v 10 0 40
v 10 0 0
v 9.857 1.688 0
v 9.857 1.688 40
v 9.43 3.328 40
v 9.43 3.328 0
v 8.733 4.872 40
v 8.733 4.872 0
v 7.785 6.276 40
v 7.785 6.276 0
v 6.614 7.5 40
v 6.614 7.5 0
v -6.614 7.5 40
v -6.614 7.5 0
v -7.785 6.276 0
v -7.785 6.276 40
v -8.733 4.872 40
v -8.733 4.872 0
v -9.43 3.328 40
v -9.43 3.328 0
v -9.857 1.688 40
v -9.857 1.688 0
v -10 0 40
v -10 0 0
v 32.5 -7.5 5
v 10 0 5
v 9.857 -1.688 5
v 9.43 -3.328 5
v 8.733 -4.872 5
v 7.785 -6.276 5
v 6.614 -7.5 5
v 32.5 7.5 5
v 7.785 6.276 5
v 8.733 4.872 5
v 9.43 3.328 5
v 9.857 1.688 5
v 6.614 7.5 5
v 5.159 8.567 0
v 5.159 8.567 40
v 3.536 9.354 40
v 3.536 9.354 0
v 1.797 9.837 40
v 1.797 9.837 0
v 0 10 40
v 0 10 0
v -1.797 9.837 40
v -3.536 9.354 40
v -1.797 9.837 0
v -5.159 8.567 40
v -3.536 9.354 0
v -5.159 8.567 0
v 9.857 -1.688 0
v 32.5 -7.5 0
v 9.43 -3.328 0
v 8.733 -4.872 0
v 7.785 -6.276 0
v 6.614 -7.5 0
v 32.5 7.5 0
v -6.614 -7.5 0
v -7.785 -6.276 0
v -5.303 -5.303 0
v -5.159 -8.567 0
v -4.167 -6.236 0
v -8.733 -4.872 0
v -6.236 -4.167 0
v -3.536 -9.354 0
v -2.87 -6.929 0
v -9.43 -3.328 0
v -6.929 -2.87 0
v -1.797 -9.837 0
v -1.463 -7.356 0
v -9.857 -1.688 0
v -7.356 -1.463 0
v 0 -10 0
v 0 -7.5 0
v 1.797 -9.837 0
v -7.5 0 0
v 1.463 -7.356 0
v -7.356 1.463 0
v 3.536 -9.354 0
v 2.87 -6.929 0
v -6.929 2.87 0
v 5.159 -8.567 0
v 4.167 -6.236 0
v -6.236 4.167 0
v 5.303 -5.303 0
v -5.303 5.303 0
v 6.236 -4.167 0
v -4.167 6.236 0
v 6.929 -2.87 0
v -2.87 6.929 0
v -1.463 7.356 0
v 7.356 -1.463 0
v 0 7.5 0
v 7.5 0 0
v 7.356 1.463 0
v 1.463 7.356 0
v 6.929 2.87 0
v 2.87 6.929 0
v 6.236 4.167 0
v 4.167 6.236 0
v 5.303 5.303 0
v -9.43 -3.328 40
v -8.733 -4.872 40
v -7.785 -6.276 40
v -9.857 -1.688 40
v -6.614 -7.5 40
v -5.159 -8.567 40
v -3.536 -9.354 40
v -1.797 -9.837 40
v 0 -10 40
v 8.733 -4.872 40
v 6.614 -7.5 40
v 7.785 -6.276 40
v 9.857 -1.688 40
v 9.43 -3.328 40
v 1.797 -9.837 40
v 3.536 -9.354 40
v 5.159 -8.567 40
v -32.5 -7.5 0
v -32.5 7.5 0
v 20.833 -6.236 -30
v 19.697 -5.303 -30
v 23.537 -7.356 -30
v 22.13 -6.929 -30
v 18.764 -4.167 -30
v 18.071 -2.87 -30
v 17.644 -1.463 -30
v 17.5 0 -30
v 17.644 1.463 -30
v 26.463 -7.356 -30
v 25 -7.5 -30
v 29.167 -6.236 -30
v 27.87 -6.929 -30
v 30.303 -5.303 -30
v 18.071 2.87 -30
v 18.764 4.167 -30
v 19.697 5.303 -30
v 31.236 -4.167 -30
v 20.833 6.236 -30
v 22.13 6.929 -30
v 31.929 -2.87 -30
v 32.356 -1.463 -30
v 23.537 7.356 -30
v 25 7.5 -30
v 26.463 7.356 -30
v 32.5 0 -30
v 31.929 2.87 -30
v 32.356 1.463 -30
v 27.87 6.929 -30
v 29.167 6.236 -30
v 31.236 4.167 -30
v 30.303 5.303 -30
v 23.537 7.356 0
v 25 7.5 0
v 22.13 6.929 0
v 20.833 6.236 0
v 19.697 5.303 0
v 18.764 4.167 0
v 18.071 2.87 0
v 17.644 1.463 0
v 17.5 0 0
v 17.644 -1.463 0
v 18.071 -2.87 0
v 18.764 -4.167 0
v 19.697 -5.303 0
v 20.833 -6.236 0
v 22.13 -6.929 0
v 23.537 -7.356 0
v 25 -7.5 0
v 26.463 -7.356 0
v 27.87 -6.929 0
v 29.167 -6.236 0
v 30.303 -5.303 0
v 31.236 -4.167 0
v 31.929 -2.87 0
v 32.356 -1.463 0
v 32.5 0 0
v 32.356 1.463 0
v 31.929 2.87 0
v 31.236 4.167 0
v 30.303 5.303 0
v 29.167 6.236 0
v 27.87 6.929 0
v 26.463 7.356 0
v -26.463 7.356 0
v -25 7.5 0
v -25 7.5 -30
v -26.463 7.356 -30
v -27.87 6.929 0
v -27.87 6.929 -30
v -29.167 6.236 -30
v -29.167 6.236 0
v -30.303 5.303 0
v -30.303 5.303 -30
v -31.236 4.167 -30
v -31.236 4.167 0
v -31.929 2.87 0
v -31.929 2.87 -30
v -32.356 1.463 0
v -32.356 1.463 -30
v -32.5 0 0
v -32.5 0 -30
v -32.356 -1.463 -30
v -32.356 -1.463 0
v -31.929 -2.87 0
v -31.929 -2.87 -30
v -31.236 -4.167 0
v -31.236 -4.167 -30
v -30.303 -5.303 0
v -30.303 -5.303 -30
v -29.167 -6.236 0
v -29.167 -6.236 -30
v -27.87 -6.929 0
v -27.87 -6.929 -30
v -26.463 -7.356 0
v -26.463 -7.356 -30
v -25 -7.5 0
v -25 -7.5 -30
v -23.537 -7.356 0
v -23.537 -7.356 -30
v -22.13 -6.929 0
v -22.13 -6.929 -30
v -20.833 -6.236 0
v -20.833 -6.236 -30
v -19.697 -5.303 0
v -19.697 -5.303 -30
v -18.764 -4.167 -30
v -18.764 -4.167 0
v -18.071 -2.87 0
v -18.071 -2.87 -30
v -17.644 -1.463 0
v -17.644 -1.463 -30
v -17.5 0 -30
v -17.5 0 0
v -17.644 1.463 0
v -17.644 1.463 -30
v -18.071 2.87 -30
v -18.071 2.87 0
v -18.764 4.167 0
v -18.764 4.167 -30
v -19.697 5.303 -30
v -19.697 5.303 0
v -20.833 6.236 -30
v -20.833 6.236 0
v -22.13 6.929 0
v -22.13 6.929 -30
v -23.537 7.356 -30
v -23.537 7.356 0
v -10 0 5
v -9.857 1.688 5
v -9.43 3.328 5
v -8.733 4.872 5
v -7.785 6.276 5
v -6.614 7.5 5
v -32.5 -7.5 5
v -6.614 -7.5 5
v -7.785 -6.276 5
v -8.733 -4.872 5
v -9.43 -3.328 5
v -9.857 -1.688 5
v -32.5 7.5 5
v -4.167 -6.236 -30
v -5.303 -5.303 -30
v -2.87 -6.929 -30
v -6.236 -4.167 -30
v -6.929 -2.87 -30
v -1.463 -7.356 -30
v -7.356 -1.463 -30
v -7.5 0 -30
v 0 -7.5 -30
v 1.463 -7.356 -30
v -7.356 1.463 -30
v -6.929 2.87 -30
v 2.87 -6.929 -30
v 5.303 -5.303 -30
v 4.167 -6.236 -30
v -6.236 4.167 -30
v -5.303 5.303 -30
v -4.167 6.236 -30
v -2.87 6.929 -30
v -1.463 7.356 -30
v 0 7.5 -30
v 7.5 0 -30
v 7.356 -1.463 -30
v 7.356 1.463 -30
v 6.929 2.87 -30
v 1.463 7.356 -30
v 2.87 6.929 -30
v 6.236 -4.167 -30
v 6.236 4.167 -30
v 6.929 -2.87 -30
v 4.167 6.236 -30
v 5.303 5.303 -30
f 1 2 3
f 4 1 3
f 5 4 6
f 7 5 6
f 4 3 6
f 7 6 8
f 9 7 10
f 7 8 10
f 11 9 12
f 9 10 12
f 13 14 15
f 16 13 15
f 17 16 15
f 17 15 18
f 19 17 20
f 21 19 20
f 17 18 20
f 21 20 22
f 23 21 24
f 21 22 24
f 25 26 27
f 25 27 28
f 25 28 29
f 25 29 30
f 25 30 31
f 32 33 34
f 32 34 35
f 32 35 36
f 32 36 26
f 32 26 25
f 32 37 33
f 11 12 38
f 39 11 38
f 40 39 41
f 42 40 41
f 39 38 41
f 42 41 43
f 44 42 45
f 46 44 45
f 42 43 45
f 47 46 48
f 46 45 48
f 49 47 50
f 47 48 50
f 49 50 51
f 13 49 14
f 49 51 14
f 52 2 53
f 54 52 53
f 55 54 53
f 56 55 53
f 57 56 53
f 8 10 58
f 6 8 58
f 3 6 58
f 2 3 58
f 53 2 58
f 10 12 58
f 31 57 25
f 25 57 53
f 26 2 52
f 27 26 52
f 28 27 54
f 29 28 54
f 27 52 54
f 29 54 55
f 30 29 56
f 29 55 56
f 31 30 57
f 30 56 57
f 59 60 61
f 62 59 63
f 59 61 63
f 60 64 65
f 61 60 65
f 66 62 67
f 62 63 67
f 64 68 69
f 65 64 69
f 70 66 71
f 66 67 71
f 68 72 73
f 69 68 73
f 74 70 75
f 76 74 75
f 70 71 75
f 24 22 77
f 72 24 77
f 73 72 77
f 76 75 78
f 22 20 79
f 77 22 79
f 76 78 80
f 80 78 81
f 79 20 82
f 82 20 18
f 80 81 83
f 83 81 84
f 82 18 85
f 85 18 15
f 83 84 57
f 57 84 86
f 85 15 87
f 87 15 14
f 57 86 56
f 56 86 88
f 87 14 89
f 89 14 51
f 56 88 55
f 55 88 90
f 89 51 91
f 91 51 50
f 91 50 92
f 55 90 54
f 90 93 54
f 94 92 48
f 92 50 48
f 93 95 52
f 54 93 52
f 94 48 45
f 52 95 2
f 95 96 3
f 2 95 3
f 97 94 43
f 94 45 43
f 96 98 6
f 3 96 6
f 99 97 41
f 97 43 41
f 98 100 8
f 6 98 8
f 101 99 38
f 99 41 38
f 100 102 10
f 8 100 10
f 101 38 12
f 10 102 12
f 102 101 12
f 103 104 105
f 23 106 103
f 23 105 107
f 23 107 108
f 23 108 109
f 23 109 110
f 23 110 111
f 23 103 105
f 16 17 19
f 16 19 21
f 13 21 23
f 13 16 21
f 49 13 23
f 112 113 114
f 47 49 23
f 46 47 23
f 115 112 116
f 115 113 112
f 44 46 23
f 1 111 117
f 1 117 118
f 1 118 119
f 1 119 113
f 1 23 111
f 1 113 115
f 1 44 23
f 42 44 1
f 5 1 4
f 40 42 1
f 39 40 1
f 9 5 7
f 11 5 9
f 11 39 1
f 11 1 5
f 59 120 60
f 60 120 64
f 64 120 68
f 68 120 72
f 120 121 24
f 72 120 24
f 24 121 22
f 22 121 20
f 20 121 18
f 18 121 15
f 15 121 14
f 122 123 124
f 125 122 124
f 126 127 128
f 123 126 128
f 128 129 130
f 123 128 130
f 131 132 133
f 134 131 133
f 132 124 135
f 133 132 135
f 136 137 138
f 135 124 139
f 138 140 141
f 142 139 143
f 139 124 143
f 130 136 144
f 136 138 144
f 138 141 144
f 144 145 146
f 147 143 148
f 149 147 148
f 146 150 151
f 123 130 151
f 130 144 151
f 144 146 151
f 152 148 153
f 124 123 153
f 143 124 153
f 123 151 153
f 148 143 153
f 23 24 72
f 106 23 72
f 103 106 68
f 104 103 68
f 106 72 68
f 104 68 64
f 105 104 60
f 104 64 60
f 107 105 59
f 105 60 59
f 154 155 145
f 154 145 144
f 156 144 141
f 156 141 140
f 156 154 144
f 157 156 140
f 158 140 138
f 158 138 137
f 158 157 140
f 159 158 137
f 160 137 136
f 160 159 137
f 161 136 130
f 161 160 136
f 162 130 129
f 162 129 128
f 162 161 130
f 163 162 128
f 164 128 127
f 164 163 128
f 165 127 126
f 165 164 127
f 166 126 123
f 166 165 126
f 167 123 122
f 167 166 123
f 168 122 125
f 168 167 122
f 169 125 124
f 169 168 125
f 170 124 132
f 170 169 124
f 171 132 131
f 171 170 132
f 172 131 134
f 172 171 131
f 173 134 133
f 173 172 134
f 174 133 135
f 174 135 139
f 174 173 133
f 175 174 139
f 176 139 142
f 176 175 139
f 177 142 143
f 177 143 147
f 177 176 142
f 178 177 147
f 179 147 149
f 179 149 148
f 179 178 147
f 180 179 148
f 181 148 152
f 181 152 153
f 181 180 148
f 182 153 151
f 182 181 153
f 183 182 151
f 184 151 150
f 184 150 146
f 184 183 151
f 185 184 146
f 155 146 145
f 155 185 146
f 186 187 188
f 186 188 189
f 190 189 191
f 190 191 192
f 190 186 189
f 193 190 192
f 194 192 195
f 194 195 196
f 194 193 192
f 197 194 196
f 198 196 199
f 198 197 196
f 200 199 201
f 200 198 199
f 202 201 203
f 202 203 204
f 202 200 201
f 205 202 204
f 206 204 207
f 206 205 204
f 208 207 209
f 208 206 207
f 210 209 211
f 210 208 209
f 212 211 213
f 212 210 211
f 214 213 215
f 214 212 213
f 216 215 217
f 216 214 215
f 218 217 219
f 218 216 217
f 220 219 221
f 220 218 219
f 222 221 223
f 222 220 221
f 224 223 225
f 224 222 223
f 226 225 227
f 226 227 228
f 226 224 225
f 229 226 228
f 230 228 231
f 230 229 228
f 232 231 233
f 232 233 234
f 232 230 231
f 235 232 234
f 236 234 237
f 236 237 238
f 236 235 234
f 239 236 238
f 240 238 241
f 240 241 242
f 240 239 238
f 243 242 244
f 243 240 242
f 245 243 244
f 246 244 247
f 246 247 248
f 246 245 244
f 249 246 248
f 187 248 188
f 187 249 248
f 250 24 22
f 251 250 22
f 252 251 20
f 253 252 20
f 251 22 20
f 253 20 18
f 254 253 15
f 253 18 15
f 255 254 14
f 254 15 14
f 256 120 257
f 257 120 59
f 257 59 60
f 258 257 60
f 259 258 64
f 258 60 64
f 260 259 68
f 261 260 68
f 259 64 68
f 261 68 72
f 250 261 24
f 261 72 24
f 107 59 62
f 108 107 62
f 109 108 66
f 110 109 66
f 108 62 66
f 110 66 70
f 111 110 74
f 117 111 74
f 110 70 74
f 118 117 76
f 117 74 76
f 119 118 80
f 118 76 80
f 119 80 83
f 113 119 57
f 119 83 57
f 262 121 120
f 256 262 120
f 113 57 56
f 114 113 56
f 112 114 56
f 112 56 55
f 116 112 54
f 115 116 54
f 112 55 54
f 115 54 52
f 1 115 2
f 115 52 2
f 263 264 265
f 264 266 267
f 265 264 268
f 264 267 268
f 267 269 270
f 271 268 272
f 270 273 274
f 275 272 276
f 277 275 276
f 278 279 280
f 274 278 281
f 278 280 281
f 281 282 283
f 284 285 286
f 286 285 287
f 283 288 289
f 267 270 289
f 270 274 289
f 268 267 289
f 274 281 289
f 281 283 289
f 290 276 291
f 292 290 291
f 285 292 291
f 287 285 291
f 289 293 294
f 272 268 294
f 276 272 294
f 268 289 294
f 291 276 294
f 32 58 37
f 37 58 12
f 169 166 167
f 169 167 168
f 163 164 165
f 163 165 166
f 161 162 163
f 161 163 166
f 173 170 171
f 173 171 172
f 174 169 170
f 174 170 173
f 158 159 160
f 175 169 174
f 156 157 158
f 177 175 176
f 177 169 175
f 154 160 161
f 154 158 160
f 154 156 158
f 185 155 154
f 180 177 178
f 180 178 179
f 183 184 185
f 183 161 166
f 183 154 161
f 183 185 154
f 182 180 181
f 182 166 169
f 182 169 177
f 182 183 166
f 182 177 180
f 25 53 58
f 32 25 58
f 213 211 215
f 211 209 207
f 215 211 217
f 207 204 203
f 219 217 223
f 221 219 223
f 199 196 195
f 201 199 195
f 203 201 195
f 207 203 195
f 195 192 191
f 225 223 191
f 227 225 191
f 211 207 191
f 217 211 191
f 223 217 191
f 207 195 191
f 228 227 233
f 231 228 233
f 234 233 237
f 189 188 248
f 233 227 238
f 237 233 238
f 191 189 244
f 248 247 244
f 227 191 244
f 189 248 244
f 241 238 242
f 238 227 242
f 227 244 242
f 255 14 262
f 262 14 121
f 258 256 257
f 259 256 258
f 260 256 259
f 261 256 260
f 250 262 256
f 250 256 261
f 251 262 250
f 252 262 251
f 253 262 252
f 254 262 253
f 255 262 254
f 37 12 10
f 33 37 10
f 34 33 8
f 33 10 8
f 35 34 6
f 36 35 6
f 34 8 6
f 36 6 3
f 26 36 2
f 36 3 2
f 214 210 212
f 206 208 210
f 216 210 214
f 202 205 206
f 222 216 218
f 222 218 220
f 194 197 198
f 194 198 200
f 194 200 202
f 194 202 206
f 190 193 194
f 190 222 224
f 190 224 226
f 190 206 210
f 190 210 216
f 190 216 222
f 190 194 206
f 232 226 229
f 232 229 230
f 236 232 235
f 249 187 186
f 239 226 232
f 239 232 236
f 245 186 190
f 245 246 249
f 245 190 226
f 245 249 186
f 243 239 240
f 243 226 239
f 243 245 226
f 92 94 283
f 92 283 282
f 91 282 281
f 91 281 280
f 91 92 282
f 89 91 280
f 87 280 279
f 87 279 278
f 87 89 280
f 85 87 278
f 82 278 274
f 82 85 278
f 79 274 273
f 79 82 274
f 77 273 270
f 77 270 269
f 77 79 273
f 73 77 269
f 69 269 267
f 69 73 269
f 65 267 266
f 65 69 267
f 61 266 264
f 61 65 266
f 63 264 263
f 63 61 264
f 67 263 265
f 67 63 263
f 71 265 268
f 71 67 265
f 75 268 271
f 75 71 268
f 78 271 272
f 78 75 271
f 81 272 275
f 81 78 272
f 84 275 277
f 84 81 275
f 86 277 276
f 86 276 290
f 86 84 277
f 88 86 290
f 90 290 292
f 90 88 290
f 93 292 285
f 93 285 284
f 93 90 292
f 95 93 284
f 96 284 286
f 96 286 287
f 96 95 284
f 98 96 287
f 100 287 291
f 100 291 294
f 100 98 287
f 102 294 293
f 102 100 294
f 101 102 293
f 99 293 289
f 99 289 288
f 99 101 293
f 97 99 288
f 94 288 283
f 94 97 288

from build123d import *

# Parameters (mm, degrees)
F1_DEPTH = 30
F2_DEPTH = 40
F3_DEPTH = 5


with BuildPart() as f1:
    # F0 (on Top) → F1 (new body)
    with BuildSketch(Plane.XY):
        with BuildLine():
            ThreePointArc((-32.5, 0), (-30.3033008589, -5.3033008589), (-25, -7.5))
            ThreePointArc((-25, -7.5), (-19.6966991411, -5.3033008589), (-17.5, 0))
            ThreePointArc((-17.5, 0), (-19.6966991411, 5.3033008589), (-25, 7.5))
            ThreePointArc((-25, 7.5), (-30.3033008589, 5.3033008589), (-32.5, 0))
        make_face()
    extrude(amount=-F1_DEPTH)


with BuildPart() as f1b:
    # F0 (on Top) → F1, piece 2 (new body)
    with BuildSketch(Plane.XY):
        with BuildLine():
            ThreePointArc((-7.5, 0), (-5.3033008508, -5.303300867), (2.3e-08, -7.5))
            ThreePointArc((2.3e-08, -7.5), (5.303300867, -5.3033008508), (7.5, 0))
            ThreePointArc((7.5, 0), (5.3033008671, 5.3033008507), (2.31e-08, 7.5))
            ThreePointArc((2.31e-08, 7.5), (-5.3033008507, 5.3033008671), (-7.5, 0))
        make_face()
    extrude(amount=-F1_DEPTH)

    # F0 (on Top) → F2 (join)
    with BuildSketch(Plane.XY):
        with BuildLine():
            Line((7.5, 0), (10, 0))
            ThreePointArc((10, 0), (9.1143782777, 4.1143782777), (6.6143782777, 7.5))
            Line((6.6143782777, 7.5), (2.31e-08, 7.5))
            ThreePointArc((2.31e-08, 7.5), (5.3033008671, 5.3033008507), (7.5, 0))
        make_face()
        with BuildLine():
            Line((2.31e-08, 7.5), (6.6143782777, 7.5))
            ThreePointArc((6.6143782777, 7.5), (0, 10), (-6.6143782777, 7.5))
            Line((-6.6143782777, 7.5), (2.31e-08, 7.5))
        make_face()
        with BuildLine():
            Line((-10, 0), (-7.5, 0))
            ThreePointArc((-7.5, 0), (-5.3033008507, 5.3033008671), (2.31e-08, 7.5))
            Line((2.31e-08, 7.5), (-6.6143782777, 7.5))
            ThreePointArc((-6.6143782777, 7.5), (-9.1143782777, 4.1143782777), (-10, 0))
        make_face()
        with BuildLine():
            ThreePointArc((-7.5, 0), (-5.3033008508, -5.303300867), (2.3e-08, -7.5))
            ThreePointArc((2.3e-08, -7.5), (5.303300867, -5.3033008508), (7.5, 0))
            ThreePointArc((7.5, 0), (5.3033008671, 5.3033008507), (2.31e-08, 7.5))
            ThreePointArc((2.31e-08, 7.5), (-5.3033008507, 5.3033008671), (-7.5, 0))
        make_face()
        with BuildLine():
            Line((2.3e-08, -7.5), (6.6143782777, -7.5))
            ThreePointArc((6.6143782777, -7.5), (9.1143782777, -4.1143782777), (10, 0))
            Line((10, 0), (7.5, 0))
            ThreePointArc((7.5, 0), (5.303300867, -5.3033008508), (2.3e-08, -7.5))
        make_face()
        with BuildLine():
            ThreePointArc((-6.6143782777, -7.5), (0, -10), (6.6143782777, -7.5))
            Line((6.6143782777, -7.5), (2.3e-08, -7.5))
            Line((2.3e-08, -7.5), (-6.6143782777, -7.5))
        make_face()
        with BuildLine():
            Line((-6.6143782777, -7.5), (2.3e-08, -7.5))
            ThreePointArc((2.3e-08, -7.5), (-5.3033008508, -5.303300867), (-7.5, 0))
            Line((-7.5, 0), (-10, 0))
            ThreePointArc((-10, 0), (-9.1143782777, -4.1143782777), (-6.6143782777, -7.5))
        make_face()
    extrude(amount=F2_DEPTH)


with BuildPart() as f1c:
    # F0 (on Top) → F1, piece 3 (new body)
    with BuildSketch(Plane.XY):
        with BuildLine():
            ThreePointArc((17.5, 0), (19.6966991411, -5.3033008589), (25, -7.5))
            ThreePointArc((25, -7.5), (30.3033008589, -5.3033008589), (32.5, 0))
            ThreePointArc((32.5, 0), (30.3033008589, 5.3033008589), (25, 7.5))
            ThreePointArc((25, 7.5), (19.6966991411, 5.3033008589), (17.5, 0))
        make_face()
    extrude(amount=-F1_DEPTH)


with BuildPart() as f3:
    # F0 (on Top) → F3 (new body)
    with BuildSketch(Plane.XY):
        with BuildLine():
            Line((-32.5, 7.5), (-32.5, 0))
            ThreePointArc((-32.5, 0), (-30.3033008589, 5.3033008589), (-25, 7.5))
            Line((-25, 7.5), (-32.5, 7.5))
        make_face()
        with BuildLine():
            Line((-32.5, -7.5), (-25, -7.5))
            ThreePointArc((-25, -7.5), (-30.3033008589, -5.3033008589), (-32.5, 0))
            Line((-32.5, 0), (-32.5, -7.5))
        make_face()
        with BuildLine():
            Line((-25, -7.5), (-6.6143782777, -7.5))
            ThreePointArc((-6.6143782777, -7.5), (-9.1143782777, -4.1143782777), (-10, 0))
            Line((-10, 0), (-17.5, 0))
            ThreePointArc((-17.5, 0), (-19.6966991411, -5.3033008589), (-25, -7.5))
        make_face()
        with BuildLine():
            Line((-17.5, 0), (-10, 0))
            ThreePointArc((-10, 0), (-9.1143782777, 4.1143782777), (-6.6143782777, 7.5))
            Line((-6.6143782777, 7.5), (-25, 7.5))
            ThreePointArc((-25, 7.5), (-19.6966991411, 5.3033008589), (-17.5, 0))
        make_face()
        with BuildLine():
            ThreePointArc((-32.5, 0), (-30.3033008589, -5.3033008589), (-25, -7.5))
            ThreePointArc((-25, -7.5), (-19.6966991411, -5.3033008589), (-17.5, 0))
            ThreePointArc((-17.5, 0), (-19.6966991411, 5.3033008589), (-25, 7.5))
            ThreePointArc((-25, 7.5), (-30.3033008589, 5.3033008589), (-32.5, 0))
        make_face()
    extrude(amount=F3_DEPTH)


with BuildPart() as f3b:
    # F0 (on Top) → F3, piece 2 (new body)
    with BuildSketch(Plane.XY):
        with BuildLine():
            Line((10, 0), (17.5, 0))
            ThreePointArc((17.5, 0), (19.6966991411, 5.3033008589), (25, 7.5))
            Line((25, 7.5), (6.6143782777, 7.5))
            ThreePointArc((6.6143782777, 7.5), (9.1143782777, 4.1143782777), (10, 0))
        make_face()
        with BuildLine():
            Line((6.6143782777, -7.5), (25, -7.5))
            ThreePointArc((25, -7.5), (19.6966991411, -5.3033008589), (17.5, 0))
            Line((17.5, 0), (10, 0))
            ThreePointArc((10, 0), (9.1143782777, -4.1143782777), (6.6143782777, -7.5))
        make_face()
        with BuildLine():
            Line((25, -7.5), (32.5, -7.5))
            Line((32.5, -7.5), (32.5, 0))
            ThreePointArc((32.5, 0), (30.3033008589, -5.3033008589), (25, -7.5))
        make_face()
        with BuildLine():
            ThreePointArc((25, 7.5), (30.3033008589, 5.3033008589), (32.5, 0))
            Line((32.5, 0), (32.5, 7.5))
            Line((32.5, 7.5), (25, 7.5))
        make_face()
        with BuildLine():
            ThreePointArc((17.5, 0), (19.6966991411, -5.3033008589), (25, -7.5))
            ThreePointArc((25, -7.5), (30.3033008589, -5.3033008589), (32.5, 0))
            ThreePointArc((32.5, 0), (30.3033008589, 5.3033008589), (25, 7.5))
            ThreePointArc((25, 7.5), (19.6966991411, 5.3033008589), (17.5, 0))
        make_face()
    extrude(amount=F3_DEPTH)


solid = Compound([f1.part, f1b.part, f1c.part, f3.part, f3b.part])
